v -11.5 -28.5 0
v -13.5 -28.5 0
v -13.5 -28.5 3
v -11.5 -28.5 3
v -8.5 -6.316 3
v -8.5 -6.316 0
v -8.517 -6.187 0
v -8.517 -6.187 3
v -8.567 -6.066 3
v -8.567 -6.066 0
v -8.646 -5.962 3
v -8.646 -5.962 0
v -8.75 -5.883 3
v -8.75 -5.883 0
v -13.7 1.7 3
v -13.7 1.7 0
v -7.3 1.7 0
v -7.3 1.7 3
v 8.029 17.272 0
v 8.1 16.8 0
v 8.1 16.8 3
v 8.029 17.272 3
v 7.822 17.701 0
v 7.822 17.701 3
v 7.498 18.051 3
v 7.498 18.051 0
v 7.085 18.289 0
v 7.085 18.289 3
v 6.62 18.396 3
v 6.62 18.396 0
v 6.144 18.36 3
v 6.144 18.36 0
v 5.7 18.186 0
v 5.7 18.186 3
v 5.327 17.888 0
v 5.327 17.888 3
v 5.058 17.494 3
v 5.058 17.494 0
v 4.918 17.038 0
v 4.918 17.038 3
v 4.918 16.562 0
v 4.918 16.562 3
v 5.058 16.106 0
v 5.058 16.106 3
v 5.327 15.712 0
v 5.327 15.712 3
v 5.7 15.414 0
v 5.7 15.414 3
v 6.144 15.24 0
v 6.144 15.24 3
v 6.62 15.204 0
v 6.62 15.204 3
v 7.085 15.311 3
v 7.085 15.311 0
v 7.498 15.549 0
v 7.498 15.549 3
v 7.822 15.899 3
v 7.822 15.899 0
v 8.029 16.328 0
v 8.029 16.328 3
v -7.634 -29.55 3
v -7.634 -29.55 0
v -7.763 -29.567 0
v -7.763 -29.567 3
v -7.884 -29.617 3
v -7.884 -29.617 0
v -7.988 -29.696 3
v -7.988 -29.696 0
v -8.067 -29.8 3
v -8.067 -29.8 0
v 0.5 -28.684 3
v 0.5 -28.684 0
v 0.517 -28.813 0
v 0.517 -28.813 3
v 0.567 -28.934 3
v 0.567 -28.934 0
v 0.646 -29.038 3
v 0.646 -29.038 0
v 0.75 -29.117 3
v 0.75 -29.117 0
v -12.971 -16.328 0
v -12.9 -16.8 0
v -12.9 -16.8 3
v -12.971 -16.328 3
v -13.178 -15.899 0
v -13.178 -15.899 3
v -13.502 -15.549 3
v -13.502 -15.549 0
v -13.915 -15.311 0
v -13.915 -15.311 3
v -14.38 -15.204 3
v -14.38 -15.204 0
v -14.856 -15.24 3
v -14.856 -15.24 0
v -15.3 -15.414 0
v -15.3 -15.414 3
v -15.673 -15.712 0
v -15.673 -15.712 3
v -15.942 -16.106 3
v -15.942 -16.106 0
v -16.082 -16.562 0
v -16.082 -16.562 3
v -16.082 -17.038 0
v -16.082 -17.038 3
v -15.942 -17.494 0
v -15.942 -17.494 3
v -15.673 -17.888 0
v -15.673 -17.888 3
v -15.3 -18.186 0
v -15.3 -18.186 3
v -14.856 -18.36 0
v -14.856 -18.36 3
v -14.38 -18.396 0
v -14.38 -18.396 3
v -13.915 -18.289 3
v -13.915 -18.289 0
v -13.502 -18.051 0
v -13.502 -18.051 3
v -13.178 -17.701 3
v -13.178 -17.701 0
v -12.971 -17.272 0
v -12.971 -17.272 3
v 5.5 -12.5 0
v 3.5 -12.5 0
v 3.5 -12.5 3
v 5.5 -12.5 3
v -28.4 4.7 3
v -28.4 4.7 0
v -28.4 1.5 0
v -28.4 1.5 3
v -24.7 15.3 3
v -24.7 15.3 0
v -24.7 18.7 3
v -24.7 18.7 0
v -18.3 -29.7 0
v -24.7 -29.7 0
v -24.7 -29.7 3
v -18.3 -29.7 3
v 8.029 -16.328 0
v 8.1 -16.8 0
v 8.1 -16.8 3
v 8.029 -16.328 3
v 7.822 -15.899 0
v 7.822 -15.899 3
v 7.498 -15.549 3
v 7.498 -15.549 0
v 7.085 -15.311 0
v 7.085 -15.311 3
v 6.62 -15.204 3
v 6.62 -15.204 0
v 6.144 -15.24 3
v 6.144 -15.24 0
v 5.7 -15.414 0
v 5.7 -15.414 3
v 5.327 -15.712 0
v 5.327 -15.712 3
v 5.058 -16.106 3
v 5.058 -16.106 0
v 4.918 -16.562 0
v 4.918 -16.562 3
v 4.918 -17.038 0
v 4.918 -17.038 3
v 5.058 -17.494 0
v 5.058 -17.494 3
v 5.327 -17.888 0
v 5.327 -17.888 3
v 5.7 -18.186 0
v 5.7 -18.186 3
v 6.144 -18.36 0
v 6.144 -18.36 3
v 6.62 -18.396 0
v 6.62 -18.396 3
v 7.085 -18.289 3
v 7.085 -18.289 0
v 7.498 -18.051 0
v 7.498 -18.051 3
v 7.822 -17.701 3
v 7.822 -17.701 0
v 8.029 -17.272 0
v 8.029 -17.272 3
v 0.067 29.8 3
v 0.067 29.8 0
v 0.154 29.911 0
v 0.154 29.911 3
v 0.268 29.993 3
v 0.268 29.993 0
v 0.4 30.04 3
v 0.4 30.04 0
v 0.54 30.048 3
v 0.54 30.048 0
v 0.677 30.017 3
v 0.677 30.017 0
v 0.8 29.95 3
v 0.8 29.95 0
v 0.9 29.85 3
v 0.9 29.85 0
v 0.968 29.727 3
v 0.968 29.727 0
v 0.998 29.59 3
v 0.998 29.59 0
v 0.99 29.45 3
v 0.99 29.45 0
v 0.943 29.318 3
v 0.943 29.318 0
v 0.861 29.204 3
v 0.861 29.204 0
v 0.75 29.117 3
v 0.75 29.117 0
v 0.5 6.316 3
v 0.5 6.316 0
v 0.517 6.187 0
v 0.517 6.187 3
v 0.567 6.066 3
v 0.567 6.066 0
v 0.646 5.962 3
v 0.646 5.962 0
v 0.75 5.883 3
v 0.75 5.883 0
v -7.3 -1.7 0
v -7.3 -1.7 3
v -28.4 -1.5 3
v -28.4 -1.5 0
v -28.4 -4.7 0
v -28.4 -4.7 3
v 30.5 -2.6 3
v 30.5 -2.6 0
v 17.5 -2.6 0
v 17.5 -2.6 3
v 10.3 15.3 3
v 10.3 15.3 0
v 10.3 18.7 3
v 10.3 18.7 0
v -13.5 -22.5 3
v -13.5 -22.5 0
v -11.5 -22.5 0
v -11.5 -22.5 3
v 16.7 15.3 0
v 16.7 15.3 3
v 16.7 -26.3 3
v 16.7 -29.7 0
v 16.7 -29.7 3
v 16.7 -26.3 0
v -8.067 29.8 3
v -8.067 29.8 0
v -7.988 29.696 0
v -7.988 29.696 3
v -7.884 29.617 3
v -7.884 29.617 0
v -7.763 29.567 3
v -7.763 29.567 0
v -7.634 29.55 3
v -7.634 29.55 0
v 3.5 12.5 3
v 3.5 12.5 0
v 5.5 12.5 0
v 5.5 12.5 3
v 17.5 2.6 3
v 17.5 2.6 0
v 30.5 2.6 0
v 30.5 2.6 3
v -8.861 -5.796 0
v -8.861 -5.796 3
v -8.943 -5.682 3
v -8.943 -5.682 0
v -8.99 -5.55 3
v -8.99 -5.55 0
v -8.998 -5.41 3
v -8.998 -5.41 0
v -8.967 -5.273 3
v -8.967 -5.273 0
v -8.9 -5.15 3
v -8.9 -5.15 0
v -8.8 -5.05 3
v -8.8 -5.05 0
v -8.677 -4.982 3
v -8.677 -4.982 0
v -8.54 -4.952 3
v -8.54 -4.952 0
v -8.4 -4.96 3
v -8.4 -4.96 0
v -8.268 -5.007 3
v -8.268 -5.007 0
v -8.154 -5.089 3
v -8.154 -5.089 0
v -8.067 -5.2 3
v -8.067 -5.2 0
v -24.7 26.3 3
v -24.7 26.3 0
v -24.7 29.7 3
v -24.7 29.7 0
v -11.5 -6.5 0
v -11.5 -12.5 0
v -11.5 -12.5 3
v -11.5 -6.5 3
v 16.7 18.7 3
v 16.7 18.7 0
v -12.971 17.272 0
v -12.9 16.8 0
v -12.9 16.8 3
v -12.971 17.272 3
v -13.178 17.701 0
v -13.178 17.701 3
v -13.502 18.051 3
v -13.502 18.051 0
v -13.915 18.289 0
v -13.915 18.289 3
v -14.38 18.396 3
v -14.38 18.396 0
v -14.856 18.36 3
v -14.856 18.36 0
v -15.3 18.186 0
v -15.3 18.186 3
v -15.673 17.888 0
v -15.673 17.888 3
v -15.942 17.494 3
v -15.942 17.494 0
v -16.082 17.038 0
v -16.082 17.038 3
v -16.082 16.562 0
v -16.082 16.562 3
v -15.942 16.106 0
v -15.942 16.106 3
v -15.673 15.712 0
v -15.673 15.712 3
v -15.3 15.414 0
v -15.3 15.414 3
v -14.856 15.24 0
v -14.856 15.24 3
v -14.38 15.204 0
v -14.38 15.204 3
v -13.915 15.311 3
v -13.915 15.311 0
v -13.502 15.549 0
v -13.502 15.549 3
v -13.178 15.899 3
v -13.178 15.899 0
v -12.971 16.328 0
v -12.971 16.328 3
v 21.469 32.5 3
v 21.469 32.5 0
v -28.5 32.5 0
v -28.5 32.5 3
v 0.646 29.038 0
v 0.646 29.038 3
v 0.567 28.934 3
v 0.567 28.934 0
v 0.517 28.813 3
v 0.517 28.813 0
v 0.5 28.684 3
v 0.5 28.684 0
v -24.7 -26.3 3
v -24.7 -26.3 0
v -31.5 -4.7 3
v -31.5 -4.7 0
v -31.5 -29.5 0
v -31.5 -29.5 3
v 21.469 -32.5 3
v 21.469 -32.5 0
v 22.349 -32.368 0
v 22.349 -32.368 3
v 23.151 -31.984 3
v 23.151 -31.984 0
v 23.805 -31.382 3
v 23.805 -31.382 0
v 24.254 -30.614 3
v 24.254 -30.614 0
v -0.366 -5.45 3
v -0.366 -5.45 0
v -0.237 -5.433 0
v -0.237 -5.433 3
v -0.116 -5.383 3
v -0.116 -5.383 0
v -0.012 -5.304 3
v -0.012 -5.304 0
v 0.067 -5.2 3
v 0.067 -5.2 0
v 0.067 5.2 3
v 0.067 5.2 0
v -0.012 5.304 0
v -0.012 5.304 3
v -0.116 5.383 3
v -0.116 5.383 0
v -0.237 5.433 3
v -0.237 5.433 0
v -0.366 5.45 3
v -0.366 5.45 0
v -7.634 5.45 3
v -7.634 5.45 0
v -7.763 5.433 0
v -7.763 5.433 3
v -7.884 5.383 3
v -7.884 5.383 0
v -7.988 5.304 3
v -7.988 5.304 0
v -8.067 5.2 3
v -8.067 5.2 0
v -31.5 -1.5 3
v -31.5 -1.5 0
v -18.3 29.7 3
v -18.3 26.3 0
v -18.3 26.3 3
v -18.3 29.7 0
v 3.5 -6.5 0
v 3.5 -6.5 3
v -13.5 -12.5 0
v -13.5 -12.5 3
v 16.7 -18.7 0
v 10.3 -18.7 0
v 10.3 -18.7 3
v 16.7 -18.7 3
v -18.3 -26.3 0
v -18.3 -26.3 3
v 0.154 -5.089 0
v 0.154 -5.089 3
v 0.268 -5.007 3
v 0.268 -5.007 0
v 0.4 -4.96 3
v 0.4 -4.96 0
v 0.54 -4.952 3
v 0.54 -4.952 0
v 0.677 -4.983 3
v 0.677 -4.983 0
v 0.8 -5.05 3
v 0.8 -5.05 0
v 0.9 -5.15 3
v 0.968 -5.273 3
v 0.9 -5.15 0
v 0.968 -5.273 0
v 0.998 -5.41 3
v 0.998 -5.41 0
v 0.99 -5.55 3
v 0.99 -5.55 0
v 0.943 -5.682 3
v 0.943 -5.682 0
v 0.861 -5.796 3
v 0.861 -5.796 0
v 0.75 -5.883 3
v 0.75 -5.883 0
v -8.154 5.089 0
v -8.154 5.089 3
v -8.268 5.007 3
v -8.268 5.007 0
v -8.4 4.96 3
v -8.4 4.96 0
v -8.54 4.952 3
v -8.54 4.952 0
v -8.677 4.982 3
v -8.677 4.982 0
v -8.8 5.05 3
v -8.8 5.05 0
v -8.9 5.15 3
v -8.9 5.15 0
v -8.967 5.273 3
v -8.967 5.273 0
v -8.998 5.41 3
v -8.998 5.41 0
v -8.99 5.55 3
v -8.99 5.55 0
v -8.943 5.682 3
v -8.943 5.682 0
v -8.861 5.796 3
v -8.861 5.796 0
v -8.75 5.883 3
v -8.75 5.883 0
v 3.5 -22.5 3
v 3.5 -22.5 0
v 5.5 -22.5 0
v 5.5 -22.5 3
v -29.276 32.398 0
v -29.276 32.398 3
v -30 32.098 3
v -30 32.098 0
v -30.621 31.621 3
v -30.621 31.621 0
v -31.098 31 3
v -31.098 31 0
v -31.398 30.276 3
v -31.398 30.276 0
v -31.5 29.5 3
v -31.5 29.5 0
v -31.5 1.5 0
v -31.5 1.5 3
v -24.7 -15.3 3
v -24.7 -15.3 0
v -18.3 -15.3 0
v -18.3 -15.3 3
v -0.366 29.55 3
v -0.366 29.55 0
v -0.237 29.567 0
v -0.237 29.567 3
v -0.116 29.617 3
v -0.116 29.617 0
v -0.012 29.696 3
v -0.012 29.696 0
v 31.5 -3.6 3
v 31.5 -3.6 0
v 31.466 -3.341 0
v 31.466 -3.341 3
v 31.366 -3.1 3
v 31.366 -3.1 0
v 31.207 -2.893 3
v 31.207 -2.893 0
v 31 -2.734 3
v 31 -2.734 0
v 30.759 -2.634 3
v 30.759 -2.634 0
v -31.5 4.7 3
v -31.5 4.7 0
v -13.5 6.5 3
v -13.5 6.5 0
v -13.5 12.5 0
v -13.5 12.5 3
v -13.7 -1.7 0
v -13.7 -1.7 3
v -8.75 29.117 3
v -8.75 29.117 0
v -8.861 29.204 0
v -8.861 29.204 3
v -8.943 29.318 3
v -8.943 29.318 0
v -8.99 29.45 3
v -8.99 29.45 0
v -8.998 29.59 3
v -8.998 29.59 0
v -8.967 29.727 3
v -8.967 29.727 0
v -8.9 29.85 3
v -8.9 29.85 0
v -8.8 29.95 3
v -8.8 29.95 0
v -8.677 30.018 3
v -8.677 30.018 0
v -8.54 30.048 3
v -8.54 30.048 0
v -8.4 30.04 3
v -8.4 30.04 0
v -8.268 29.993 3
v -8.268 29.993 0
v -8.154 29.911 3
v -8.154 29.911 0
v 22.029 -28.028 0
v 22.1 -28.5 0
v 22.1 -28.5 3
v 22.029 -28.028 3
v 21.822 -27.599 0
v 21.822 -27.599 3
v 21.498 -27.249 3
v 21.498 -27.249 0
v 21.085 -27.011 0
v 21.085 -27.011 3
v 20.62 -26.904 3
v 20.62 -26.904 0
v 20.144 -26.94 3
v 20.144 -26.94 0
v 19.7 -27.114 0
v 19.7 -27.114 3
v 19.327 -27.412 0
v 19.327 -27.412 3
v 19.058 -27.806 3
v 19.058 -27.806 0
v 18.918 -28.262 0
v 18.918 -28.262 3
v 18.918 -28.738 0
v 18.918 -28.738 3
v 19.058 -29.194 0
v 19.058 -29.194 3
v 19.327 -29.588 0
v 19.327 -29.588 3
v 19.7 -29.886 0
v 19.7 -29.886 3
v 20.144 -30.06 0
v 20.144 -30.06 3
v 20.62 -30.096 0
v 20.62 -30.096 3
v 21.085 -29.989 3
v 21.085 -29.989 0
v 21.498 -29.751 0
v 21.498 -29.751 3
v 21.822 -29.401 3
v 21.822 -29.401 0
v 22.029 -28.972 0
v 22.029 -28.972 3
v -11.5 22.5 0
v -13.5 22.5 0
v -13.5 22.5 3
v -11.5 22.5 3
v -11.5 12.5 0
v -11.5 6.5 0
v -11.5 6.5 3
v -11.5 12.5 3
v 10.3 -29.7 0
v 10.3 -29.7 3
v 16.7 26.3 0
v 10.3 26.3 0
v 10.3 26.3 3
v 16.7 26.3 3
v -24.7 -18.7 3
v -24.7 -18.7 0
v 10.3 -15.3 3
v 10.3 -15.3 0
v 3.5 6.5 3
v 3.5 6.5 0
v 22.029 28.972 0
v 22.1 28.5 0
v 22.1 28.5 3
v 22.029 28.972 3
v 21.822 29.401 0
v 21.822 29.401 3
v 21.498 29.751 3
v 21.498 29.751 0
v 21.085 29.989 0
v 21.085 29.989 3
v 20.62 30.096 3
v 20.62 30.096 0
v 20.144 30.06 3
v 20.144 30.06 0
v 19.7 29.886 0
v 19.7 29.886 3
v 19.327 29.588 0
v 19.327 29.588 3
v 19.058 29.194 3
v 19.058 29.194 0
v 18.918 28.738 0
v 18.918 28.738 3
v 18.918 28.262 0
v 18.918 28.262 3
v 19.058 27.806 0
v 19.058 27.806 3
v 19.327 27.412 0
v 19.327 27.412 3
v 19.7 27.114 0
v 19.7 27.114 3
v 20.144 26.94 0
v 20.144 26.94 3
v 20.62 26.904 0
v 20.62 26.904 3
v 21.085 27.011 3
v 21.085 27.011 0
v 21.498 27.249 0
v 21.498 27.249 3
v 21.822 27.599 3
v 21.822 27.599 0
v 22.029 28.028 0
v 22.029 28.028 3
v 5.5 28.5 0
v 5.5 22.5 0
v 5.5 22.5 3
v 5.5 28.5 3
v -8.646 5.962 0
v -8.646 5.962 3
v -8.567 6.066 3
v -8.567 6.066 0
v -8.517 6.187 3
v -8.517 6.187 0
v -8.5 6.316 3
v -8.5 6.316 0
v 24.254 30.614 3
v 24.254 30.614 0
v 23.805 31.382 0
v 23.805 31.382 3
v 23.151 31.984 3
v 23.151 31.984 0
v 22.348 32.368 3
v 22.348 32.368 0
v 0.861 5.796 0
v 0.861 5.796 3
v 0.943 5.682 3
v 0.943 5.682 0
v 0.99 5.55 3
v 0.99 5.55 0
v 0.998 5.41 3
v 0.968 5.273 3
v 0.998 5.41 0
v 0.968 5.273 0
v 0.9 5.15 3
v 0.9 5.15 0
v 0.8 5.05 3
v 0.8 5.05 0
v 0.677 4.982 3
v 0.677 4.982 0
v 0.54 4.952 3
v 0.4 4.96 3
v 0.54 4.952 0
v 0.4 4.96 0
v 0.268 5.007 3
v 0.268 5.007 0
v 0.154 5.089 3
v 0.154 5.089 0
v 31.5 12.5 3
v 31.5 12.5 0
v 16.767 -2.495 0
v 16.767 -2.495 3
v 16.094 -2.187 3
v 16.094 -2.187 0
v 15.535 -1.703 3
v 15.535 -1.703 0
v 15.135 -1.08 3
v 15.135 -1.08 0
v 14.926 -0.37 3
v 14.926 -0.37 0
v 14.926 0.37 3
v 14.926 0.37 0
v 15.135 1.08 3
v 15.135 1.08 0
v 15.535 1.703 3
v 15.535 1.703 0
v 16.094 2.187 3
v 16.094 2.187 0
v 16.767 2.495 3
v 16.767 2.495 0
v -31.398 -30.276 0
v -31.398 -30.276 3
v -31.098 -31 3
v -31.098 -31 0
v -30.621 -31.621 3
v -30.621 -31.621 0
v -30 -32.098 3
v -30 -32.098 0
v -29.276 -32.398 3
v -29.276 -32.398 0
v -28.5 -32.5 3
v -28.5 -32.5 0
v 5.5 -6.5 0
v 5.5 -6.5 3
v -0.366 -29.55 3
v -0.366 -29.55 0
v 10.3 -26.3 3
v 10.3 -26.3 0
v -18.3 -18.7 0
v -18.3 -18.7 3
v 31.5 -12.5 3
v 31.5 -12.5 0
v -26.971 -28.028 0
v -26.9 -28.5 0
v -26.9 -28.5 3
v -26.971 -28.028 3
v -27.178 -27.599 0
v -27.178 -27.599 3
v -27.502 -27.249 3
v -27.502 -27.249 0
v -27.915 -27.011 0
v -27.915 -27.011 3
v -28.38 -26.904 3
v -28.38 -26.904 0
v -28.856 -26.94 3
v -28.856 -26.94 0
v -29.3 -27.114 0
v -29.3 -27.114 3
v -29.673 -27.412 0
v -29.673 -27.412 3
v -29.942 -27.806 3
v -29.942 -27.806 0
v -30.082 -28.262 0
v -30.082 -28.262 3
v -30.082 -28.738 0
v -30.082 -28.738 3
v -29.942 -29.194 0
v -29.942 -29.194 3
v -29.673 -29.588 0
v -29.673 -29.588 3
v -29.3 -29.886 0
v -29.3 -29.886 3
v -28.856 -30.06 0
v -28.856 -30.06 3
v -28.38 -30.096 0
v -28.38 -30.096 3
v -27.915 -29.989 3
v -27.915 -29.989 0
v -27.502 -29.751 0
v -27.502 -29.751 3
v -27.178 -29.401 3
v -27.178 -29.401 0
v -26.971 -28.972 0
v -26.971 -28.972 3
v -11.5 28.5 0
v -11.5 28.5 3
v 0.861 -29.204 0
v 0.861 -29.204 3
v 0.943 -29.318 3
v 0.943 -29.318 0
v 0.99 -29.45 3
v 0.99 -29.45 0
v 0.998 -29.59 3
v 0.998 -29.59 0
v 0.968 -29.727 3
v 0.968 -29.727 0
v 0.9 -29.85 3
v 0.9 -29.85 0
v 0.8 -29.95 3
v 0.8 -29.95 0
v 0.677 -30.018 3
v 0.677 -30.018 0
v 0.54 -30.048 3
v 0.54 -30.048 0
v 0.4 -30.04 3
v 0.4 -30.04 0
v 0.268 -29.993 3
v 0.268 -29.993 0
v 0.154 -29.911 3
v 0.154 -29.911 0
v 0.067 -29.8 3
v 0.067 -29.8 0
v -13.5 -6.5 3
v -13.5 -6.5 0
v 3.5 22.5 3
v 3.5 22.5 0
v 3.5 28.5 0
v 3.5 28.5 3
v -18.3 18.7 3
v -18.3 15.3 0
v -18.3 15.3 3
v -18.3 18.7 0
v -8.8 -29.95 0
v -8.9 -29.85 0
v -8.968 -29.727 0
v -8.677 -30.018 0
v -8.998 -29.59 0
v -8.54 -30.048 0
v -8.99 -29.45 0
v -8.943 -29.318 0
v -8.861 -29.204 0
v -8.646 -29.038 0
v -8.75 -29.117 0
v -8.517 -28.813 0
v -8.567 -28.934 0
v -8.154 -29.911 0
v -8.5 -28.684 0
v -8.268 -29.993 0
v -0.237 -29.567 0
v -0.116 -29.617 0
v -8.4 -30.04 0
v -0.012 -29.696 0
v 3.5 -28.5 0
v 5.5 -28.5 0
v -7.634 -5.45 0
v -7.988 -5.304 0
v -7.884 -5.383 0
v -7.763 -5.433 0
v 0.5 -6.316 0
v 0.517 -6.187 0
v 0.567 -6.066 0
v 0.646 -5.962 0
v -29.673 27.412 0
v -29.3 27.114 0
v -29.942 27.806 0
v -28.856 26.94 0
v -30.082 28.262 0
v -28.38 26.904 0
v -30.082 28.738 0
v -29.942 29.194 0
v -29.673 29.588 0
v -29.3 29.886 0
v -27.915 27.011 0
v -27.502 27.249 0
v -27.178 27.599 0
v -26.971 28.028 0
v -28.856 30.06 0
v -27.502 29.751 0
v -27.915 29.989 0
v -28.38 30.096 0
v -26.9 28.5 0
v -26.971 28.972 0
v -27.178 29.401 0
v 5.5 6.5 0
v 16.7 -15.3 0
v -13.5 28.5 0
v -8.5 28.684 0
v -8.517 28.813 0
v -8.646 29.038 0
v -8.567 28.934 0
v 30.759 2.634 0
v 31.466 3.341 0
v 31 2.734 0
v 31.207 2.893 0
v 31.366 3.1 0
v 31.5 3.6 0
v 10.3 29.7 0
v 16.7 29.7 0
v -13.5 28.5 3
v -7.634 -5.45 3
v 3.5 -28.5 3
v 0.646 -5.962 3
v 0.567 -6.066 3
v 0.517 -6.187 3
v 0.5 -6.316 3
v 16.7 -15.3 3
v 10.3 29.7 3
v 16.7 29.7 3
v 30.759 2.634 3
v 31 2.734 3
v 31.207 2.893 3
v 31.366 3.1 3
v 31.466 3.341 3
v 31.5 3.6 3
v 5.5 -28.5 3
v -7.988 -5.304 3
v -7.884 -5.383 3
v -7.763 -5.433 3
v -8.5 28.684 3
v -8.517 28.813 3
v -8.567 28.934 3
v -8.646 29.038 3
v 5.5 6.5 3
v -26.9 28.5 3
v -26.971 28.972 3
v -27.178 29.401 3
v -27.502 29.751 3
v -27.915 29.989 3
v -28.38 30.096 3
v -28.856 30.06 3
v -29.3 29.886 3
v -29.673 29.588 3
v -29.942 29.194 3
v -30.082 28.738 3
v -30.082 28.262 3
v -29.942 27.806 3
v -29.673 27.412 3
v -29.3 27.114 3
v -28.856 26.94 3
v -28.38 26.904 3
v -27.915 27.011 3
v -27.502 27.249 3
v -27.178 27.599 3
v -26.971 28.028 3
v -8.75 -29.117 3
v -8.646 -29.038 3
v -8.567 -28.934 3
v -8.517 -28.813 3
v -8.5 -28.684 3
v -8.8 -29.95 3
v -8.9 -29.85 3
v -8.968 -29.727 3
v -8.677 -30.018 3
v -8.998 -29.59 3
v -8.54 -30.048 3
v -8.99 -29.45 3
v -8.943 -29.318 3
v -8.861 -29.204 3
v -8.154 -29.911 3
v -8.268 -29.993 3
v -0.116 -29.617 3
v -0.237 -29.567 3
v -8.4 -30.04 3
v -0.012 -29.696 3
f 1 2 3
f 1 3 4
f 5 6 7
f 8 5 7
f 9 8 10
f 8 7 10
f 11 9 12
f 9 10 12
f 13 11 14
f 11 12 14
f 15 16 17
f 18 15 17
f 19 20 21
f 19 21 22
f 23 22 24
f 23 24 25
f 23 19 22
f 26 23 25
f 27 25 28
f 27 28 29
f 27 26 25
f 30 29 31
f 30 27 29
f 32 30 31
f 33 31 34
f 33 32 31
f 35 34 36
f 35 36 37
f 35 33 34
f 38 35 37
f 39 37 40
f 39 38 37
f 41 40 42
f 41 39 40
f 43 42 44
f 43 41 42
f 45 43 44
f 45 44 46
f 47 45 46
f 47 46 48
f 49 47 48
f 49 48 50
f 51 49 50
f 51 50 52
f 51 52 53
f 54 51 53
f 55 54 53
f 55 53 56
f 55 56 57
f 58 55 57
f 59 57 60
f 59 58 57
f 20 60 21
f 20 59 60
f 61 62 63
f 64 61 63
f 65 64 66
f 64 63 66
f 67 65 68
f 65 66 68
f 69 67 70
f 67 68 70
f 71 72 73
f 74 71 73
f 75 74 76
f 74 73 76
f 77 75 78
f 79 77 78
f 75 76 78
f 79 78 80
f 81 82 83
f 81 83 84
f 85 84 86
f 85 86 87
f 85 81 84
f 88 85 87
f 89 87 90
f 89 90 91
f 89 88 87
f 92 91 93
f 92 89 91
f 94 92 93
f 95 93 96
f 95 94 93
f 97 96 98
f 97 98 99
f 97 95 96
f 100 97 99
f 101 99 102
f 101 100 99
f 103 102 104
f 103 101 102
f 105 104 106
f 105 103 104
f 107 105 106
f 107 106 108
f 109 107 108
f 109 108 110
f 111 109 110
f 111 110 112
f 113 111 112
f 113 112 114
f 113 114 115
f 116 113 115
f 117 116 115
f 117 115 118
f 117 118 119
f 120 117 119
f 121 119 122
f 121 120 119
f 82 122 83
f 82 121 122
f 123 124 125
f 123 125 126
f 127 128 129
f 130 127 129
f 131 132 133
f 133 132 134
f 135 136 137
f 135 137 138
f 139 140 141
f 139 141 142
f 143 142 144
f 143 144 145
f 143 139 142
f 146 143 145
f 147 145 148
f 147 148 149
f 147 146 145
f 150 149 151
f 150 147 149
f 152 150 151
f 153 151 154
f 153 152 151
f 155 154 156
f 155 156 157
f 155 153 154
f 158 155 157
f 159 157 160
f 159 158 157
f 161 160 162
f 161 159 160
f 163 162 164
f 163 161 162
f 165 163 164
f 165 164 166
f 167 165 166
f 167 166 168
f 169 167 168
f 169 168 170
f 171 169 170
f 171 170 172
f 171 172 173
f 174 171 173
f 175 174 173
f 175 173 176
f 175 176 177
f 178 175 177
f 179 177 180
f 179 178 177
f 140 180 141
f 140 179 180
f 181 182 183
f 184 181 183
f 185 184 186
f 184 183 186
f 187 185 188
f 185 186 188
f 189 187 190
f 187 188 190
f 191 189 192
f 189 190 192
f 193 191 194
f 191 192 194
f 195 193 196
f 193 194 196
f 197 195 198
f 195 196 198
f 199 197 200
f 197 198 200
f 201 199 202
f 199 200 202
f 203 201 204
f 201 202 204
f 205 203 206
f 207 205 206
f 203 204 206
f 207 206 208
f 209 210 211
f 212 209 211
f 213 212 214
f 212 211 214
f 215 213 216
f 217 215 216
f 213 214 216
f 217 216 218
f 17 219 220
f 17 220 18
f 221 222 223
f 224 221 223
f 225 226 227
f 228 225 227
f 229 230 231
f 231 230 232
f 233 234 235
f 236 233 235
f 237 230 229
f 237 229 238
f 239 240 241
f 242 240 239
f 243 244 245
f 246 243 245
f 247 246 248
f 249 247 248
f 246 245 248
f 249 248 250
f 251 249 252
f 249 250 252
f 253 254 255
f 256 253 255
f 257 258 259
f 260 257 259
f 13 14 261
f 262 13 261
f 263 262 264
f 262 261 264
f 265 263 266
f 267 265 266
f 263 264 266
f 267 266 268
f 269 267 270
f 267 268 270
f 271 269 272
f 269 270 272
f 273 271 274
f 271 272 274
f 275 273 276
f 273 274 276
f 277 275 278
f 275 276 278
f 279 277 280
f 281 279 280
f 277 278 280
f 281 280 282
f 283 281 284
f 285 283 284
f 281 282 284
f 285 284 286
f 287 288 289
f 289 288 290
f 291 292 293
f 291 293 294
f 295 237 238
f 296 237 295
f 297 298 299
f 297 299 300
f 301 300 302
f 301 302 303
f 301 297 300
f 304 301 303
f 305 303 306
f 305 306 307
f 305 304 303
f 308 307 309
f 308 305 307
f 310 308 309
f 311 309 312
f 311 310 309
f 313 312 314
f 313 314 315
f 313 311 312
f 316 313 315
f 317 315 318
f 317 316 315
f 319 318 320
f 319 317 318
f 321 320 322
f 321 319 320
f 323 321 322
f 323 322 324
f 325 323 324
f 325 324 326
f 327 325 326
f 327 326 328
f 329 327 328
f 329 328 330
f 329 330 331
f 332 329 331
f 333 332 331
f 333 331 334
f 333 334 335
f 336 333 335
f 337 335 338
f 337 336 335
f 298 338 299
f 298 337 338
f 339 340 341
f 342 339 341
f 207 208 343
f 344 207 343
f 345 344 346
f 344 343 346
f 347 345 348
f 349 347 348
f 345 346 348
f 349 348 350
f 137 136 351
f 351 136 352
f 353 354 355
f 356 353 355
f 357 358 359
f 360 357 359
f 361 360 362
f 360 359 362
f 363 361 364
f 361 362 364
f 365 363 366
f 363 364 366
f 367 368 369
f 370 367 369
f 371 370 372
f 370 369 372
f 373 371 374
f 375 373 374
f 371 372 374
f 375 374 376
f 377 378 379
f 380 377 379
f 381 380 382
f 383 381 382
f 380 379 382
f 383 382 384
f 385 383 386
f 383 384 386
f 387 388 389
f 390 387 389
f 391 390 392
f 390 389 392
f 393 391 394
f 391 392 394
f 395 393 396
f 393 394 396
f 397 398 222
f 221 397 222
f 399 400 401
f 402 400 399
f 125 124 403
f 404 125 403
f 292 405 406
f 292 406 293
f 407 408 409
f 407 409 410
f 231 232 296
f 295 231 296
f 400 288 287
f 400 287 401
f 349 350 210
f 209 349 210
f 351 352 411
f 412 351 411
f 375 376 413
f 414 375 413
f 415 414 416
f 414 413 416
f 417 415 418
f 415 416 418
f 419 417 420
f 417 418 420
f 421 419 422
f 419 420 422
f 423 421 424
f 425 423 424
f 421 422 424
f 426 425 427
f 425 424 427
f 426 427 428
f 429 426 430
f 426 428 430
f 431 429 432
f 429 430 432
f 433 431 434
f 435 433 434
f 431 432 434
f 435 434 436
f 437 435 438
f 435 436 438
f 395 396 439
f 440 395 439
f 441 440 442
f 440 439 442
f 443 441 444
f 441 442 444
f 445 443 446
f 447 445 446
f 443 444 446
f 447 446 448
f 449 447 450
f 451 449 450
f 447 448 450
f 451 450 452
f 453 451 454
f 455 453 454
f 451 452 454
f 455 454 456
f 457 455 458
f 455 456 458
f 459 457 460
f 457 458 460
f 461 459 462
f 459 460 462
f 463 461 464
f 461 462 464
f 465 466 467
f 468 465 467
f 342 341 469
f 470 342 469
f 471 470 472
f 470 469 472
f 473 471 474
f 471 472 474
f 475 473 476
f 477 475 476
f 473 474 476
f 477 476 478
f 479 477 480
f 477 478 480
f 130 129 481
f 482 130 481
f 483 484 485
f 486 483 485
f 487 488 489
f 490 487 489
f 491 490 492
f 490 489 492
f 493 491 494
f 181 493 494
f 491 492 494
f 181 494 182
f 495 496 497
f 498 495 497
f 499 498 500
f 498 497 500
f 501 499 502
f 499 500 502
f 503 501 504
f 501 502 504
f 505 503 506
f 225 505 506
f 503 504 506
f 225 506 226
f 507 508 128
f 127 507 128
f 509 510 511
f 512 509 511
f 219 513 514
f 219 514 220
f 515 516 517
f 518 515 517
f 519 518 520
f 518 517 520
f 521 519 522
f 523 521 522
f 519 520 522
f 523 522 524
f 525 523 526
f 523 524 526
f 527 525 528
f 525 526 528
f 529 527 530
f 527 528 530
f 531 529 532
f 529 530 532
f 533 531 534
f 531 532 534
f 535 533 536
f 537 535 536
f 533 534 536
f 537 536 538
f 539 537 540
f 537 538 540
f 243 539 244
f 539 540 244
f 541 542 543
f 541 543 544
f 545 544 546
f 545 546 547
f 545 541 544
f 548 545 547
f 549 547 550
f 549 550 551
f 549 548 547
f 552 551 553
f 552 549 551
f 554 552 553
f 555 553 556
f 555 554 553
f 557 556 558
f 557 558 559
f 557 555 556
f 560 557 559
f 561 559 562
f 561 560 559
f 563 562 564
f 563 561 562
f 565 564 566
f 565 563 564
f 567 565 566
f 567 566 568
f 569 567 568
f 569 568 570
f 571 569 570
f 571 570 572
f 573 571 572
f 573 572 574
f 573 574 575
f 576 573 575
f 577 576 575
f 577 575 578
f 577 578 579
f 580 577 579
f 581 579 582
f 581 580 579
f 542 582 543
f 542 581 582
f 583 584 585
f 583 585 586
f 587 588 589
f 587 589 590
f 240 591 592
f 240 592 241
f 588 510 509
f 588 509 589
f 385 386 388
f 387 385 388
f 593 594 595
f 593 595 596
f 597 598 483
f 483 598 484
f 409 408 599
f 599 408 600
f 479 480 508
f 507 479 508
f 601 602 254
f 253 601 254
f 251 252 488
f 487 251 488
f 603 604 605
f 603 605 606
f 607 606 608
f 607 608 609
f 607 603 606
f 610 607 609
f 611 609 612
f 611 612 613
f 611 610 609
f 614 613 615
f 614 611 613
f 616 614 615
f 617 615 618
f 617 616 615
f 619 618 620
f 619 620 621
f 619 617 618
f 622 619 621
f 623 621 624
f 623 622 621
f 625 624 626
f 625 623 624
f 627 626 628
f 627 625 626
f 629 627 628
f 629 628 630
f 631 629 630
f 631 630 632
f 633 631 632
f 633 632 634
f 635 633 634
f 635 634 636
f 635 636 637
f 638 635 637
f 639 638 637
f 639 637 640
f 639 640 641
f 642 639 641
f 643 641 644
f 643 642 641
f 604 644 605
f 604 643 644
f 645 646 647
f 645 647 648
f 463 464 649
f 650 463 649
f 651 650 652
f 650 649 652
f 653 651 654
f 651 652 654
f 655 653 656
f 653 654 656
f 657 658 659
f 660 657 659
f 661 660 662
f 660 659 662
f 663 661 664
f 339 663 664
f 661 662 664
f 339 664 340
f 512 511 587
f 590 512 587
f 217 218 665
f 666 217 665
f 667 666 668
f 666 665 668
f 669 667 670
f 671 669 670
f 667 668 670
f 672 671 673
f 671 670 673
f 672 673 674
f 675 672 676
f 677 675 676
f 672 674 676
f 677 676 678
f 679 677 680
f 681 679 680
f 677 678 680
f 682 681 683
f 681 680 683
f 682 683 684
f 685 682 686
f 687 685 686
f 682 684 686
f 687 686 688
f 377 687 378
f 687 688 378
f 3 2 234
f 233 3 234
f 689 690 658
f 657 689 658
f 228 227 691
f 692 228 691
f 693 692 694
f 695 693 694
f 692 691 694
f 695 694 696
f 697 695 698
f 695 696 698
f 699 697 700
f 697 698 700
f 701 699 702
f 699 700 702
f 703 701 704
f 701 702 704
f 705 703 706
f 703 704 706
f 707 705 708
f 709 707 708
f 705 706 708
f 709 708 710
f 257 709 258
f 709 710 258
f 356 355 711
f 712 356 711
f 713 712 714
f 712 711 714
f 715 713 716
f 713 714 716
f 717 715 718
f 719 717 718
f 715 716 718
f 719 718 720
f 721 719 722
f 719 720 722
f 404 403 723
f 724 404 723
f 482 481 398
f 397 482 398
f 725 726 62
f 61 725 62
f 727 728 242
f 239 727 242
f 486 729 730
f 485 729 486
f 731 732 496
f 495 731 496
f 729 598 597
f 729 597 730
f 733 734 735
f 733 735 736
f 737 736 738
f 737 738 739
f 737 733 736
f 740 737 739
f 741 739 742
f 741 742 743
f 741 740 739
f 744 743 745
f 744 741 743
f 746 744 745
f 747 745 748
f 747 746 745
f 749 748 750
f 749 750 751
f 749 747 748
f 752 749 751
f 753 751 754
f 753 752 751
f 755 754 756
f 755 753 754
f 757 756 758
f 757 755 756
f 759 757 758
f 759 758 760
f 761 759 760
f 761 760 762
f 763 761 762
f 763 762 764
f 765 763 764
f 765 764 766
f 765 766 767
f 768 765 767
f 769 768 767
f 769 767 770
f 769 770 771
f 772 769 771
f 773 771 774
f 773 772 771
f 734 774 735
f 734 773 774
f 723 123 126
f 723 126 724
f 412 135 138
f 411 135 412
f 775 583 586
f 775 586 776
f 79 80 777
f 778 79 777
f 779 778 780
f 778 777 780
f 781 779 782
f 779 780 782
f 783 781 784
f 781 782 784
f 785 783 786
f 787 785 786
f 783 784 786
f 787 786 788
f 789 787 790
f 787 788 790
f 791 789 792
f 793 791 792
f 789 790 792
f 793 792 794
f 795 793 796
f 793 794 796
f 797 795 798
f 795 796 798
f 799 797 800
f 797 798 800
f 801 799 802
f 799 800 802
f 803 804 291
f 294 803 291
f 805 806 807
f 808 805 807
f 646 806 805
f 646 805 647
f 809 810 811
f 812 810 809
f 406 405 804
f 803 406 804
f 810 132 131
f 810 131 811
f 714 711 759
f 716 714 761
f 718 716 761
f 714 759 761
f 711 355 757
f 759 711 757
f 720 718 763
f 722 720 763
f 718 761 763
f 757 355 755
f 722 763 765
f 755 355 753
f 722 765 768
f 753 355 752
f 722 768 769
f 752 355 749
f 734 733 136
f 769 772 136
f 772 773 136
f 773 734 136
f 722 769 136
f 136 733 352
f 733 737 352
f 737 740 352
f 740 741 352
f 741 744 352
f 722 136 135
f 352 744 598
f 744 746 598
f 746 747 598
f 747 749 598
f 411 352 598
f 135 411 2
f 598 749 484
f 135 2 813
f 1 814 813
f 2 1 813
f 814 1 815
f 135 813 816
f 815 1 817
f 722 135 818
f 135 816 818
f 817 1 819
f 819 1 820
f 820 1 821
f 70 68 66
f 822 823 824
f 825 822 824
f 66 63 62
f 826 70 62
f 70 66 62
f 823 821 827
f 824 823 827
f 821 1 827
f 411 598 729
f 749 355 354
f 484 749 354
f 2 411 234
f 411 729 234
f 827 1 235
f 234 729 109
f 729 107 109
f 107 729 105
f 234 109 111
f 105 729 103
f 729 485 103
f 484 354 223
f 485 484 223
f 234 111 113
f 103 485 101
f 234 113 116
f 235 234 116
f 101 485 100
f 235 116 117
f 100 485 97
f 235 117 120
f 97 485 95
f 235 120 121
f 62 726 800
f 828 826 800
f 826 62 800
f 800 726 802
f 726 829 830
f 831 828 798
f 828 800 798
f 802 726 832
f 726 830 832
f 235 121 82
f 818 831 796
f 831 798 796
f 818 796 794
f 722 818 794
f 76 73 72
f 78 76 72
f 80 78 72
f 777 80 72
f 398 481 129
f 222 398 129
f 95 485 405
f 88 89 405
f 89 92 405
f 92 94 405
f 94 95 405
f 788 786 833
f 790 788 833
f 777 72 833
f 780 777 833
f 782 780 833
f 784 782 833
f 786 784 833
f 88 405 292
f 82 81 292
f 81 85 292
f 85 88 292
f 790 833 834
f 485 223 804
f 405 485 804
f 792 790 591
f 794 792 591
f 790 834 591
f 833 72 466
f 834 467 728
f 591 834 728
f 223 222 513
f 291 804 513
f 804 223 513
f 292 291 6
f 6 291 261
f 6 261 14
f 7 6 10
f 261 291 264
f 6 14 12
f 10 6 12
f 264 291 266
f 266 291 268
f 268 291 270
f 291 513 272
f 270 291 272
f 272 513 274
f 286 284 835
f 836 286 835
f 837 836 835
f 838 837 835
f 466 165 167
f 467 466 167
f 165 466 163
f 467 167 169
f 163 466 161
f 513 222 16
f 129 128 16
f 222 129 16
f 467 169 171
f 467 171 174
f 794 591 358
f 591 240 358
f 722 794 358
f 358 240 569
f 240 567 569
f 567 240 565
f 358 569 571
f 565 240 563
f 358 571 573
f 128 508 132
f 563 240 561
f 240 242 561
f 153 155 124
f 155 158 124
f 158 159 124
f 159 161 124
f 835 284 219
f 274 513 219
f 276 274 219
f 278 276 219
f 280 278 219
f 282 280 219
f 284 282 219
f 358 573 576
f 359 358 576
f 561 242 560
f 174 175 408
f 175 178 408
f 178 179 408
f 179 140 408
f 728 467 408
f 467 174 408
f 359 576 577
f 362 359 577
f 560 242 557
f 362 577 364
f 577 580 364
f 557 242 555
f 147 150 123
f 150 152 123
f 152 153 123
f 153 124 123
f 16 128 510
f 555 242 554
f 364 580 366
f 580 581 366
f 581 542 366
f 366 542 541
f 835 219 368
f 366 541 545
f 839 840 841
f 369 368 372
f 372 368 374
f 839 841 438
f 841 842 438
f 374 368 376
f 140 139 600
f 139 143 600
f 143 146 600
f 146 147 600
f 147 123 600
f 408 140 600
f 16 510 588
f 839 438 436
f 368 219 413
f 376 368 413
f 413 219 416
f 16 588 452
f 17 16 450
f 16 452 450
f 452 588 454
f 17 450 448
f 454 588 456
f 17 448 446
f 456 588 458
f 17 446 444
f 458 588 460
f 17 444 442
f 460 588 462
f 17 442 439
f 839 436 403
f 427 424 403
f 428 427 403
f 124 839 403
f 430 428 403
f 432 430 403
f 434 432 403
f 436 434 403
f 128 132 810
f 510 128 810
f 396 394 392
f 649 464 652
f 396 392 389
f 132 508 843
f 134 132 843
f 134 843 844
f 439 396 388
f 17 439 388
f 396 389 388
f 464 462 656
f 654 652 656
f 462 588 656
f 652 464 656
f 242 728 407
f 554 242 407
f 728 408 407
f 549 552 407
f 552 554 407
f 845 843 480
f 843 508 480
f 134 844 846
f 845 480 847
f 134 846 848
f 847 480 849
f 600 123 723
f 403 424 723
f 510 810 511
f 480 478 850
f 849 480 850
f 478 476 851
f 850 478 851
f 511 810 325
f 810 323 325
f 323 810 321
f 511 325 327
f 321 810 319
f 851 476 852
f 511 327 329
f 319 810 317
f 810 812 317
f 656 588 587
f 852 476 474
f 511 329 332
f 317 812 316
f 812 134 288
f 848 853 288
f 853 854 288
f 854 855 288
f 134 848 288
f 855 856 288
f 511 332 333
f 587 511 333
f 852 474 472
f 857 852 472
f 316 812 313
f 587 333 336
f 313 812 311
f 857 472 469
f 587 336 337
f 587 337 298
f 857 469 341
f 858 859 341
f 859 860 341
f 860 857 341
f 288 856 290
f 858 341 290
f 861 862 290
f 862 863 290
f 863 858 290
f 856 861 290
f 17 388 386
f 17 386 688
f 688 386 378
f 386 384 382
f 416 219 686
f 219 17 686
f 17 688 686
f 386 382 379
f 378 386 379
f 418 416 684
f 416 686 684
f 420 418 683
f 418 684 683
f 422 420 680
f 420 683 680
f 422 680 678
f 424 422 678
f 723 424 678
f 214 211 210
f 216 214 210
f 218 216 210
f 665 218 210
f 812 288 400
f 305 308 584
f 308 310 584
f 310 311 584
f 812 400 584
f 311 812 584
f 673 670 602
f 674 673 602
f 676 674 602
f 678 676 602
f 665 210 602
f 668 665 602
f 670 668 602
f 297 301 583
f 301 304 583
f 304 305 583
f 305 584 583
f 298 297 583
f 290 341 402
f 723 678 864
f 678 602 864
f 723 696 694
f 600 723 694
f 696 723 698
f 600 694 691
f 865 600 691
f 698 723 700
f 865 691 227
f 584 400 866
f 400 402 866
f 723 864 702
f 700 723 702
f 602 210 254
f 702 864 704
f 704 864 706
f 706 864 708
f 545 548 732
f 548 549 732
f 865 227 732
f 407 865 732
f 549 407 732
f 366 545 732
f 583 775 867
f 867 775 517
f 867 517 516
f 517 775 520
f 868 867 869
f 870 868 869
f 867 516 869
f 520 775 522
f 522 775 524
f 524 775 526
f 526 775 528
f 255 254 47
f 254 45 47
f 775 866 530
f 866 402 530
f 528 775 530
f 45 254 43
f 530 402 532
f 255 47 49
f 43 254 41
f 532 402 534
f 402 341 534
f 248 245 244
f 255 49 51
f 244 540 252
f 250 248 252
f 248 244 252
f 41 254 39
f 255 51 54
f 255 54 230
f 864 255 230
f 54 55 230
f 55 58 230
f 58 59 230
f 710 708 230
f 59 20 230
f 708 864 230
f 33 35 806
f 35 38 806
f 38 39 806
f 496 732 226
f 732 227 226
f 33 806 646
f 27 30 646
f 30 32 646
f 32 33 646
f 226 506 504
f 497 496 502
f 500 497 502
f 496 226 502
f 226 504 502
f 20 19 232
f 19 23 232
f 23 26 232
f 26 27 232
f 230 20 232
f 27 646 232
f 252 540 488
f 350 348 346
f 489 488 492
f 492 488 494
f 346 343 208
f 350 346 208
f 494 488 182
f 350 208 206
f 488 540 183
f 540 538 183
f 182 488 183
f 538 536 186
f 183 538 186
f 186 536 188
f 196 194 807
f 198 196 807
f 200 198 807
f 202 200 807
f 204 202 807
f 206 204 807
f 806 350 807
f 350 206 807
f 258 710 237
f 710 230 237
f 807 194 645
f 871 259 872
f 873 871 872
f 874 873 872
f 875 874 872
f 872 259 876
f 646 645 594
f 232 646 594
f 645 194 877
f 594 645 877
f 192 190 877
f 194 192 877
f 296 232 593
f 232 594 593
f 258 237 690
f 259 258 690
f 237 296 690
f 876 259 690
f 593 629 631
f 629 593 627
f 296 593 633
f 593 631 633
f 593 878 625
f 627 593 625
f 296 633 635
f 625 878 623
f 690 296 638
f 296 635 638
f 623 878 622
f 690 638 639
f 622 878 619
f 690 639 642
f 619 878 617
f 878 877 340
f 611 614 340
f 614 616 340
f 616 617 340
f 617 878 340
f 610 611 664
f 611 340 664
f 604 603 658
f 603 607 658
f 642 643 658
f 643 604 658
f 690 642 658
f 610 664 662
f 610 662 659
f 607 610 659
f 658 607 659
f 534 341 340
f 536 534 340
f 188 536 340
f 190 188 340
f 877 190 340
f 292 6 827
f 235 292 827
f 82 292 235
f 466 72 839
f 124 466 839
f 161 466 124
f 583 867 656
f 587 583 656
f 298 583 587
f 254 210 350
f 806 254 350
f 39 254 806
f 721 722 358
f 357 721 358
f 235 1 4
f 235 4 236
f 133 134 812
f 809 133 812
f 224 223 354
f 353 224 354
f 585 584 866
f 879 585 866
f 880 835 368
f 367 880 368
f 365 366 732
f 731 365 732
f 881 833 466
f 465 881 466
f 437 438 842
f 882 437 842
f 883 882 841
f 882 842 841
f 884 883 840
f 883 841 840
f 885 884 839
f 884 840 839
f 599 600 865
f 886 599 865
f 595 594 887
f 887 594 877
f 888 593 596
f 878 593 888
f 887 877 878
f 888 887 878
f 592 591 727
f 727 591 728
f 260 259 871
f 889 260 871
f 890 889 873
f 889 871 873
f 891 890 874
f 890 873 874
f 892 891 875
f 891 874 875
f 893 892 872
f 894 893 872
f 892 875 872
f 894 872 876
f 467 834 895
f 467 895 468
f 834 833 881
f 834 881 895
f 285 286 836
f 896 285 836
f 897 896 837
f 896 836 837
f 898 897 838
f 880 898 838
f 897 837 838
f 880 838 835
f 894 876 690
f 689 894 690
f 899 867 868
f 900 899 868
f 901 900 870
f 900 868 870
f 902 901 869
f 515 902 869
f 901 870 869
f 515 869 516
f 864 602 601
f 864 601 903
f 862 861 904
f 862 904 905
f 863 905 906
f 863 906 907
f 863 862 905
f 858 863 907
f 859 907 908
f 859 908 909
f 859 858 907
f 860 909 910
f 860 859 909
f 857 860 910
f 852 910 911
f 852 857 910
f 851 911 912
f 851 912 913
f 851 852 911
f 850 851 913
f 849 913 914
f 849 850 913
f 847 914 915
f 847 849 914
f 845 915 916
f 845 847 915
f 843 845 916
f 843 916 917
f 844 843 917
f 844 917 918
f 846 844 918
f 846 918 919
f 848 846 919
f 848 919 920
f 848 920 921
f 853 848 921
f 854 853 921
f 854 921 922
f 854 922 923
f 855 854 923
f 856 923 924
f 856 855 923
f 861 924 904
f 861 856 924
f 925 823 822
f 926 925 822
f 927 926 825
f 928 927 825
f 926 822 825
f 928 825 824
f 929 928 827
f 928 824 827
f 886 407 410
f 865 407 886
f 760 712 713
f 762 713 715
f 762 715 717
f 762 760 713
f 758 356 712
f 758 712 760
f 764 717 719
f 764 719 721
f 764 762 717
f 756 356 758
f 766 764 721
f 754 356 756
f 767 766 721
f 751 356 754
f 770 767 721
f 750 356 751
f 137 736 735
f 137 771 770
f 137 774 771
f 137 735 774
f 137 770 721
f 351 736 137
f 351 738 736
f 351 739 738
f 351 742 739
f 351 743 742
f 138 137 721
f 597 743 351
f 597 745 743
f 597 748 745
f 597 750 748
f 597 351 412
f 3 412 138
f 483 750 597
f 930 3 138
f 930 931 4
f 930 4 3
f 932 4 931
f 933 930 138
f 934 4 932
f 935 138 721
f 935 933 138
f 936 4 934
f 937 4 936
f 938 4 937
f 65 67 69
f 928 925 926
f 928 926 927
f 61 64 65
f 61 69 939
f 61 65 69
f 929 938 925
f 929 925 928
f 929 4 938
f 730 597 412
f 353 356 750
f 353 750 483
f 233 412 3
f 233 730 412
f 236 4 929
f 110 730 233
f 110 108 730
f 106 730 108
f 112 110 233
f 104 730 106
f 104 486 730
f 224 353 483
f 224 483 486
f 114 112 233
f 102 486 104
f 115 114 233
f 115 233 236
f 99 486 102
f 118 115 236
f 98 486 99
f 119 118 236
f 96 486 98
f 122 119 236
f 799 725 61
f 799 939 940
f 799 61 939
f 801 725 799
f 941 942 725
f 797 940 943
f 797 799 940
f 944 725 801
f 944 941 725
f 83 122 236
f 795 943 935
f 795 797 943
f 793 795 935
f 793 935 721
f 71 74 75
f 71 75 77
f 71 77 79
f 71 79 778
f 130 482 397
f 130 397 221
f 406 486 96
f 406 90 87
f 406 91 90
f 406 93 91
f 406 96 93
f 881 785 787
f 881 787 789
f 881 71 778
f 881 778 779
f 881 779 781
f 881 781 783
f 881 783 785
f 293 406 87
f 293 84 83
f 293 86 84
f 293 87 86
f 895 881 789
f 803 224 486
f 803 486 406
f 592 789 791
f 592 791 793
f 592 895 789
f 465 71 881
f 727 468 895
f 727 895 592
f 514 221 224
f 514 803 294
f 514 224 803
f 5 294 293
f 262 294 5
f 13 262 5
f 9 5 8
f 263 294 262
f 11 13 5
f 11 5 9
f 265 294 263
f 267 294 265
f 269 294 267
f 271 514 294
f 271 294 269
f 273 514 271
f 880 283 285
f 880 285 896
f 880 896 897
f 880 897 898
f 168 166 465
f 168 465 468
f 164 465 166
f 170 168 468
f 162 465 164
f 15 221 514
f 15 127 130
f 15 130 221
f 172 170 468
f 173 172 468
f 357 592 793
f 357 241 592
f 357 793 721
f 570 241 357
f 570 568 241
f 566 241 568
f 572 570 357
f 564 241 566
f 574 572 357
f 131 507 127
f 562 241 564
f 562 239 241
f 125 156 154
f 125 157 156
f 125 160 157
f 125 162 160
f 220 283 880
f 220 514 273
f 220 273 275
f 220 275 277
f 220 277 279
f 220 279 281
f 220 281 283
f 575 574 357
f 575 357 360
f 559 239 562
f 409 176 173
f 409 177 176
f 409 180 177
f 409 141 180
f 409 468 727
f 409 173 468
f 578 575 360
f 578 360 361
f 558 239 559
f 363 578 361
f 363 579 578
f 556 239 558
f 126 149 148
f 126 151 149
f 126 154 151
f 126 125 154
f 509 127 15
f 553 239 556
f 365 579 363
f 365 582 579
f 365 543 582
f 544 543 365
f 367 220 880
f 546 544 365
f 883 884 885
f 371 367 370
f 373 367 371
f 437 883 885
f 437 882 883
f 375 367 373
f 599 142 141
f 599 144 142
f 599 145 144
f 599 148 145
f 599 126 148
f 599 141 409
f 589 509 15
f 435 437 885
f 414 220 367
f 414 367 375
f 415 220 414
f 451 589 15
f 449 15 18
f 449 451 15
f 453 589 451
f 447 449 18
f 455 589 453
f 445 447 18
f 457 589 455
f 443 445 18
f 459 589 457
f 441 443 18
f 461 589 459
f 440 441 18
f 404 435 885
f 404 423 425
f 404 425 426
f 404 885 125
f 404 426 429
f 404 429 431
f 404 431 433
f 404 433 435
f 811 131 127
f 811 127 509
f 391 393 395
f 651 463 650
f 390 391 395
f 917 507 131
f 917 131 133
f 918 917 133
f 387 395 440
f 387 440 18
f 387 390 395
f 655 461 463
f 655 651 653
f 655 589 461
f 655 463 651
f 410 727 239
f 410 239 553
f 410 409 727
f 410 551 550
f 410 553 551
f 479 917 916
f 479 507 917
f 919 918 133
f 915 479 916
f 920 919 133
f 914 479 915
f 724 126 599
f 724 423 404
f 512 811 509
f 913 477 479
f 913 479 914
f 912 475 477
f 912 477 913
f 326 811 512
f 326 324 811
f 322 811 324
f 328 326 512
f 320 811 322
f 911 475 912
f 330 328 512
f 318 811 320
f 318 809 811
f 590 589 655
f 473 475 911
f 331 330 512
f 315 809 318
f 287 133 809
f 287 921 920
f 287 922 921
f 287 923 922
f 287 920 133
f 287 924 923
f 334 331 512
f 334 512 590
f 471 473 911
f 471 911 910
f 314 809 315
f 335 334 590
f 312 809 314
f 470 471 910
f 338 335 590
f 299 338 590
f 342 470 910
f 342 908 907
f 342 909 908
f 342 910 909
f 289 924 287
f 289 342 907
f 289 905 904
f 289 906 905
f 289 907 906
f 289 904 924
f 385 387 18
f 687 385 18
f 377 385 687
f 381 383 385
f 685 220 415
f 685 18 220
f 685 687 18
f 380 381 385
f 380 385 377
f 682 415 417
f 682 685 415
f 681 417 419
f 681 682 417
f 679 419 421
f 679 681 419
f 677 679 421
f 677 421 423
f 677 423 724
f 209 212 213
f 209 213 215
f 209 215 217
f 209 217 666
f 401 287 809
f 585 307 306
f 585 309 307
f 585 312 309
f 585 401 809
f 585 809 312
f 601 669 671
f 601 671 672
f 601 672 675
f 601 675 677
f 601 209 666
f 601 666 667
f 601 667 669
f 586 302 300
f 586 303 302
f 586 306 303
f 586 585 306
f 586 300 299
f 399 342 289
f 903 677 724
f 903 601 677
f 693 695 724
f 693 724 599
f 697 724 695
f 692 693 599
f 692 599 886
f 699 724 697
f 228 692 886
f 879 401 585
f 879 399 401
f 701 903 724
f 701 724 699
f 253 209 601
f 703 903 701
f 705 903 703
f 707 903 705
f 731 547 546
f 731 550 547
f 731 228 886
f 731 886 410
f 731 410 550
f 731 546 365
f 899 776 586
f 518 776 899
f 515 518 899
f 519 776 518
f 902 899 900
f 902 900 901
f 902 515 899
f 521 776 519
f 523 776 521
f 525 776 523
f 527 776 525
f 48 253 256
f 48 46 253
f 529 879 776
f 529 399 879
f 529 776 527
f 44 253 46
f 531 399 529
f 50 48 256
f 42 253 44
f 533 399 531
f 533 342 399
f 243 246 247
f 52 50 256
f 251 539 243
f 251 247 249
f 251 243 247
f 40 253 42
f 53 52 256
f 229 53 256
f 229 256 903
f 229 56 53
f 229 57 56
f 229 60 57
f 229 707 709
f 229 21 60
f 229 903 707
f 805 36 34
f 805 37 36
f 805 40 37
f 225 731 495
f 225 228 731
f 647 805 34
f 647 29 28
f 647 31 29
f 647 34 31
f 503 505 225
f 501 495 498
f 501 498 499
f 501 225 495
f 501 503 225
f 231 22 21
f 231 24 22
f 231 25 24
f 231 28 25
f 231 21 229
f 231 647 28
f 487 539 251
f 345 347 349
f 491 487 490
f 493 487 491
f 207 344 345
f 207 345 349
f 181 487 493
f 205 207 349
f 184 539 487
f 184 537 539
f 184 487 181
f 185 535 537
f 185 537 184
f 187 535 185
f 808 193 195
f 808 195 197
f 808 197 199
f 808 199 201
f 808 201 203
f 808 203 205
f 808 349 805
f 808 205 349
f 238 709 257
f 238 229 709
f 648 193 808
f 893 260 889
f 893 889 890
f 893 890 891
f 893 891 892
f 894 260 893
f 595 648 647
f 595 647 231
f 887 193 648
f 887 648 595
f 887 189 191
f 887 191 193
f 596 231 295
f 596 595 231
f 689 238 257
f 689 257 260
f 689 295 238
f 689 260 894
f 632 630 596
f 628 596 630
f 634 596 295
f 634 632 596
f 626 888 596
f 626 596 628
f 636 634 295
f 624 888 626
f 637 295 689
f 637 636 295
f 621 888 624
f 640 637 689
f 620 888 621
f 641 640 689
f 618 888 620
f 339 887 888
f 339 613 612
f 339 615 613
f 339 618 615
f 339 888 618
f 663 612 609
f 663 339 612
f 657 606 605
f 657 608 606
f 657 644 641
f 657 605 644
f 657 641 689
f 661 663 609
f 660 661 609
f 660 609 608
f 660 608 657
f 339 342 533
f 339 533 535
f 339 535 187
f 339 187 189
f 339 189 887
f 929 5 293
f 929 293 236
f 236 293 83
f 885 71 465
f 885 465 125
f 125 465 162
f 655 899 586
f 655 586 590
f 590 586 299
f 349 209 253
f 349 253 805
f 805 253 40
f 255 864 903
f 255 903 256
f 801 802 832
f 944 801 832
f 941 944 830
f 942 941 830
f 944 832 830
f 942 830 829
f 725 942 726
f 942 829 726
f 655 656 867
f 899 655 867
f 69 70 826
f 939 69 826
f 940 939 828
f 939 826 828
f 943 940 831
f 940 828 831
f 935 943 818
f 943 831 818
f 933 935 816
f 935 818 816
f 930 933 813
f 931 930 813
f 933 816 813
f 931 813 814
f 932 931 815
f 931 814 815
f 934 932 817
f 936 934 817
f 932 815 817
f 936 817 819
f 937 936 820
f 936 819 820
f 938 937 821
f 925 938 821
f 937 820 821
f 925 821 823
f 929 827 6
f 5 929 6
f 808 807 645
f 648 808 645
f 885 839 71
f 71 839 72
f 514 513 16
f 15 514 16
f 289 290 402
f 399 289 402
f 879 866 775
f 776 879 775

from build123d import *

# Parameters (mm, degrees)
F0_R     = 1.6
F0_W     = 6.4
F0_H     = 3.4
F0_W_2   = 2
F0_H_2   = 6
F1_DEPTH = 3


# Not quite as in the source:
# - ends of sketch curves that miss each other by under 0.0002 mm in the source are joined


with BuildPart() as f1:
    # F0 (on Top) → F1 (new body)
    with BuildSketch(Plane.XY):
        with BuildLine():
            Line((-31.5, 1.5), (-31.5, -1.5))
            Line((-31.5, -1.5), (-28.4, -1.5))
            Line((-28.4, -1.5), (-28.4, -4.7))
            Line((-28.4, -4.7), (-31.5, -4.7))
            Line((-31.5, -4.7), (-31.5, -29.5))
            ThreePointArc((-31.5, -29.5), (-30.6213203436, -31.6213203436), (-28.5, -32.5))
            Line((-28.5, -32.5), (21.468901, -32.5))
            ThreePointArc((21.468901, -32.5), (23.1507874279, -31.9842016914), (24.2543310727, -30.6141720291))
            Line((24.2543310727, -30.6141720291), (31.5, -12.5))
            Line((31.5, -12.5), (31.5, -3.6))
            ThreePointArc((31.5, -3.6), (31.2071067812, -2.8928932188), (30.5, -2.6))
            Line((30.5, -2.6), (17.5, -2.6))
            ThreePointArc((17.5, -2.6), (14.9, 0), (17.5, 2.6))
            Line((17.5, 2.6), (30.5, 2.6))
            ThreePointArc((30.5, 2.6), (31.2071067812, 2.8928932188), (31.5, 3.6))
            Line((31.5, 3.6), (31.5, 12.5))
            Line((31.5, 12.5), (24.2543, 30.6142))
            ThreePointArc((24.2543, 30.6142), (23.1507874279, 31.9842016914), (21.468901, 32.5))
            Line((21.468901, 32.5), (-28.5, 32.5))
            ThreePointArc((-28.5, 32.5), (-30.6213203436, 31.6213203436), (-31.5, 29.5))
            Line((-31.5, 29.5), (-31.5, 4.7))
            Line((-31.5, 4.7), (-28.4, 4.7))
            Line((-28.4, 4.7), (-28.4, 1.5))
            Line((-28.4, 1.5), (-31.5, 1.5))
        make_face()
        with Locations((-28.5, -28.5)):
            Circle(F0_R, mode=Mode.SUBTRACT)
        with Locations((-21.5, -28)):
            Rectangle(F0_W, F0_H, mode=Mode.SUBTRACT)
        with Locations((-21.5, -17)):
            Rectangle(F0_W, F0_H, mode=Mode.SUBTRACT)
        with Locations((-12.5, -25.5)):
            Rectangle(F0_W_2, F0_H_2, mode=Mode.SUBTRACT)
        with Locations((-14.5, -16.8)):
            Circle(F0_R, mode=Mode.SUBTRACT)
        with BuildLine():
            ThreePointArc((-8.0669872236, -29.8000098709), (-8.8535526014, -29.9035641797), (-8.7500018039, -29.1169983396))
            ThreePointArc((-8.7500018039, -29.1169983396), (-8.5669873354, -28.9339800645), (-8.5, -28.68398))
            Line((-8.5, -28.68398), (-8.5, -6.316))
            ThreePointArc((-8.5, -6.316), (-8.5669873354, -6.0659999355), (-8.7500001291, -5.8829872236))
            ThreePointArc((-8.7500001291, -5.8829872236), (-8.8535533906, -5.0964466094), (-8.0669872236, -5.2000001291))
            ThreePointArc((-8.0669872236, -5.2000001291), (-7.8840000645, -5.3830126646), (-7.634, -5.45))
            Line((-7.634, -5.45), (-0.366, -5.45))
            ThreePointArc((-0.366, -5.45), (-0.1159999355, -5.3830126646), (0.0670127764, -5.1999998709))
            ThreePointArc((0.0670127764, -5.1999998709), (0.8535541797, -5.0964473986), (0.7499998709, -5.8830127764))
            ThreePointArc((0.7499998709, -5.8830127764), (0.5669873354, -6.0659999355), (0.5, -6.316))
            Line((0.5, -6.316), (0.5, -28.68397))
            ThreePointArc((0.5, -28.68397), (0.5669873354, -28.9339700645), (0.7500001291, -29.1169827764))
            ThreePointArc((0.7500001291, -29.1169827764), (0.8535533906, -29.9035533906), (0.0669872236, -29.7999998709))
            ThreePointArc((0.0669872236, -29.7999998709), (-0.1159999355, -29.6169873354), (-0.366, -29.55))
            Line((-0.366, -29.55), (-7.634, -29.55001))
            ThreePointArc((-7.634, -29.55001), (-7.8840000645, -29.6169973354), (-8.0669872236, -29.8000098709))
        make_face(mode=Mode.SUBTRACT)
        with Locations((-12.5, -9.5)):
            Rectangle(F0_W_2, F0_H_2, mode=Mode.SUBTRACT)
        with Locations((4.5, -25.5)):
            Rectangle(F0_W_2, F0_H_2, mode=Mode.SUBTRACT)
        with Locations((13.5, -28)):
            Rectangle(F0_W, F0_H, mode=Mode.SUBTRACT)
        with Locations((6.5, -16.8)):
            Circle(F0_R, mode=Mode.SUBTRACT)
        with Locations((13.5, -17)):
            Rectangle(F0_W, F0_H, mode=Mode.SUBTRACT)
        with Locations((20.5, -28.5)):
            Circle(F0_R, mode=Mode.SUBTRACT)
        with Locations((4.5, -9.5)):
            Rectangle(F0_W_2, F0_H_2, mode=Mode.SUBTRACT)
        with Locations((-10.5, 0)):
            Rectangle(F0_W, F0_H, mode=Mode.SUBTRACT)
        with Locations((-12.5, 9.5)):
            Rectangle(F0_W_2, F0_H_2, mode=Mode.SUBTRACT)
        with Locations((-21.5, 17)):
            Rectangle(F0_W, F0_H, mode=Mode.SUBTRACT)
        with Locations((-28.5, 28.5)):
            Circle(F0_R, mode=Mode.SUBTRACT)
        with Locations((-21.5, 28)):
            Rectangle(F0_W, F0_H, mode=Mode.SUBTRACT)
        with Locations((-14.5, 16.8)):
            Circle(F0_R, mode=Mode.SUBTRACT)
        with BuildLine():
            ThreePointArc((-8.0669772236, 5.1999911291), (-8.8535424247, 5.0964366435), (-8.7499922369, 5.8830024104))
            ThreePointArc((-8.7499922369, 5.8830024104), (-8.5669772104, 6.066020152), (-8.49999, 6.31602))
            Line((-8.49999, 6.31602), (-8.49999, 28.684))
            ThreePointArc((-8.49999, 28.684), (-8.5669773354, 28.9340000645), (-8.7499901291, 29.1170127764))
            ThreePointArc((-8.7499901291, 29.1170127764), (-8.8535432138, 29.9035535674), (-8.0669772236, 29.7999998709))
            ThreePointArc((-8.0669772236, 29.7999998709), (-7.8839900645, 29.6169873354), (-7.63399, 29.55))
            Line((-7.63399, 29.55), (-0.36599, 29.55))
            ThreePointArc((-0.36599, 29.55), (-0.1159899355, 29.6169873354), (0.0670227764, 29.8000001291))
            ThreePointArc((0.0670227764, 29.8000001291), (0.853564003, 29.9035527782), (0.7500103039, 29.1169874736))
            ThreePointArc((0.7500103039, 29.1169874736), (0.5669973354, 28.9340000645), (0.50001, 28.684))
            Line((0.50001, 28.684), (0.50001, 6.316031))
            ThreePointArc((0.50001, 6.316031), (0.5669973354, 6.0660309355), (0.7500101291, 5.8830182236))
            ThreePointArc((0.7500101291, 5.8830182236), (0.8535633906, 5.0964466094), (0.0669972236, 5.2000001291))
            ThreePointArc((0.0669972236, 5.2000001291), (-0.1159899355, 5.3830126646), (-0.36599, 5.45))
            Line((-0.36599, 5.45), (-7.63399, 5.449991))
            ThreePointArc((-7.63399, 5.449991), (-7.8839900645, 5.3830036646), (-8.0669772236, 5.1999911291))
        make_face(mode=Mode.SUBTRACT)
        with Locations((-12.5, 25.5)):
            Rectangle(F0_W_2, F0_H_2, mode=Mode.SUBTRACT)
        with Locations((4.5, 9.5)):
            Rectangle(F0_W_2, F0_H_2, mode=Mode.SUBTRACT)
        with Locations((6.5, 16.8)):
            Circle(F0_R, mode=Mode.SUBTRACT)
        with Locations((13.5, 17)):
            Rectangle(F0_W, F0_H, mode=Mode.SUBTRACT)
        with Locations((4.5, 25.5)):
            Rectangle(F0_W_2, F0_H_2, mode=Mode.SUBTRACT)
        with Locations((13.5, 28)):
            Rectangle(F0_W, F0_H, mode=Mode.SUBTRACT)
        with Locations((20.5, 28.5)):
            Circle(F0_R, mode=Mode.SUBTRACT)
    extrude(amount=F1_DEPTH)


solid = f1.part
